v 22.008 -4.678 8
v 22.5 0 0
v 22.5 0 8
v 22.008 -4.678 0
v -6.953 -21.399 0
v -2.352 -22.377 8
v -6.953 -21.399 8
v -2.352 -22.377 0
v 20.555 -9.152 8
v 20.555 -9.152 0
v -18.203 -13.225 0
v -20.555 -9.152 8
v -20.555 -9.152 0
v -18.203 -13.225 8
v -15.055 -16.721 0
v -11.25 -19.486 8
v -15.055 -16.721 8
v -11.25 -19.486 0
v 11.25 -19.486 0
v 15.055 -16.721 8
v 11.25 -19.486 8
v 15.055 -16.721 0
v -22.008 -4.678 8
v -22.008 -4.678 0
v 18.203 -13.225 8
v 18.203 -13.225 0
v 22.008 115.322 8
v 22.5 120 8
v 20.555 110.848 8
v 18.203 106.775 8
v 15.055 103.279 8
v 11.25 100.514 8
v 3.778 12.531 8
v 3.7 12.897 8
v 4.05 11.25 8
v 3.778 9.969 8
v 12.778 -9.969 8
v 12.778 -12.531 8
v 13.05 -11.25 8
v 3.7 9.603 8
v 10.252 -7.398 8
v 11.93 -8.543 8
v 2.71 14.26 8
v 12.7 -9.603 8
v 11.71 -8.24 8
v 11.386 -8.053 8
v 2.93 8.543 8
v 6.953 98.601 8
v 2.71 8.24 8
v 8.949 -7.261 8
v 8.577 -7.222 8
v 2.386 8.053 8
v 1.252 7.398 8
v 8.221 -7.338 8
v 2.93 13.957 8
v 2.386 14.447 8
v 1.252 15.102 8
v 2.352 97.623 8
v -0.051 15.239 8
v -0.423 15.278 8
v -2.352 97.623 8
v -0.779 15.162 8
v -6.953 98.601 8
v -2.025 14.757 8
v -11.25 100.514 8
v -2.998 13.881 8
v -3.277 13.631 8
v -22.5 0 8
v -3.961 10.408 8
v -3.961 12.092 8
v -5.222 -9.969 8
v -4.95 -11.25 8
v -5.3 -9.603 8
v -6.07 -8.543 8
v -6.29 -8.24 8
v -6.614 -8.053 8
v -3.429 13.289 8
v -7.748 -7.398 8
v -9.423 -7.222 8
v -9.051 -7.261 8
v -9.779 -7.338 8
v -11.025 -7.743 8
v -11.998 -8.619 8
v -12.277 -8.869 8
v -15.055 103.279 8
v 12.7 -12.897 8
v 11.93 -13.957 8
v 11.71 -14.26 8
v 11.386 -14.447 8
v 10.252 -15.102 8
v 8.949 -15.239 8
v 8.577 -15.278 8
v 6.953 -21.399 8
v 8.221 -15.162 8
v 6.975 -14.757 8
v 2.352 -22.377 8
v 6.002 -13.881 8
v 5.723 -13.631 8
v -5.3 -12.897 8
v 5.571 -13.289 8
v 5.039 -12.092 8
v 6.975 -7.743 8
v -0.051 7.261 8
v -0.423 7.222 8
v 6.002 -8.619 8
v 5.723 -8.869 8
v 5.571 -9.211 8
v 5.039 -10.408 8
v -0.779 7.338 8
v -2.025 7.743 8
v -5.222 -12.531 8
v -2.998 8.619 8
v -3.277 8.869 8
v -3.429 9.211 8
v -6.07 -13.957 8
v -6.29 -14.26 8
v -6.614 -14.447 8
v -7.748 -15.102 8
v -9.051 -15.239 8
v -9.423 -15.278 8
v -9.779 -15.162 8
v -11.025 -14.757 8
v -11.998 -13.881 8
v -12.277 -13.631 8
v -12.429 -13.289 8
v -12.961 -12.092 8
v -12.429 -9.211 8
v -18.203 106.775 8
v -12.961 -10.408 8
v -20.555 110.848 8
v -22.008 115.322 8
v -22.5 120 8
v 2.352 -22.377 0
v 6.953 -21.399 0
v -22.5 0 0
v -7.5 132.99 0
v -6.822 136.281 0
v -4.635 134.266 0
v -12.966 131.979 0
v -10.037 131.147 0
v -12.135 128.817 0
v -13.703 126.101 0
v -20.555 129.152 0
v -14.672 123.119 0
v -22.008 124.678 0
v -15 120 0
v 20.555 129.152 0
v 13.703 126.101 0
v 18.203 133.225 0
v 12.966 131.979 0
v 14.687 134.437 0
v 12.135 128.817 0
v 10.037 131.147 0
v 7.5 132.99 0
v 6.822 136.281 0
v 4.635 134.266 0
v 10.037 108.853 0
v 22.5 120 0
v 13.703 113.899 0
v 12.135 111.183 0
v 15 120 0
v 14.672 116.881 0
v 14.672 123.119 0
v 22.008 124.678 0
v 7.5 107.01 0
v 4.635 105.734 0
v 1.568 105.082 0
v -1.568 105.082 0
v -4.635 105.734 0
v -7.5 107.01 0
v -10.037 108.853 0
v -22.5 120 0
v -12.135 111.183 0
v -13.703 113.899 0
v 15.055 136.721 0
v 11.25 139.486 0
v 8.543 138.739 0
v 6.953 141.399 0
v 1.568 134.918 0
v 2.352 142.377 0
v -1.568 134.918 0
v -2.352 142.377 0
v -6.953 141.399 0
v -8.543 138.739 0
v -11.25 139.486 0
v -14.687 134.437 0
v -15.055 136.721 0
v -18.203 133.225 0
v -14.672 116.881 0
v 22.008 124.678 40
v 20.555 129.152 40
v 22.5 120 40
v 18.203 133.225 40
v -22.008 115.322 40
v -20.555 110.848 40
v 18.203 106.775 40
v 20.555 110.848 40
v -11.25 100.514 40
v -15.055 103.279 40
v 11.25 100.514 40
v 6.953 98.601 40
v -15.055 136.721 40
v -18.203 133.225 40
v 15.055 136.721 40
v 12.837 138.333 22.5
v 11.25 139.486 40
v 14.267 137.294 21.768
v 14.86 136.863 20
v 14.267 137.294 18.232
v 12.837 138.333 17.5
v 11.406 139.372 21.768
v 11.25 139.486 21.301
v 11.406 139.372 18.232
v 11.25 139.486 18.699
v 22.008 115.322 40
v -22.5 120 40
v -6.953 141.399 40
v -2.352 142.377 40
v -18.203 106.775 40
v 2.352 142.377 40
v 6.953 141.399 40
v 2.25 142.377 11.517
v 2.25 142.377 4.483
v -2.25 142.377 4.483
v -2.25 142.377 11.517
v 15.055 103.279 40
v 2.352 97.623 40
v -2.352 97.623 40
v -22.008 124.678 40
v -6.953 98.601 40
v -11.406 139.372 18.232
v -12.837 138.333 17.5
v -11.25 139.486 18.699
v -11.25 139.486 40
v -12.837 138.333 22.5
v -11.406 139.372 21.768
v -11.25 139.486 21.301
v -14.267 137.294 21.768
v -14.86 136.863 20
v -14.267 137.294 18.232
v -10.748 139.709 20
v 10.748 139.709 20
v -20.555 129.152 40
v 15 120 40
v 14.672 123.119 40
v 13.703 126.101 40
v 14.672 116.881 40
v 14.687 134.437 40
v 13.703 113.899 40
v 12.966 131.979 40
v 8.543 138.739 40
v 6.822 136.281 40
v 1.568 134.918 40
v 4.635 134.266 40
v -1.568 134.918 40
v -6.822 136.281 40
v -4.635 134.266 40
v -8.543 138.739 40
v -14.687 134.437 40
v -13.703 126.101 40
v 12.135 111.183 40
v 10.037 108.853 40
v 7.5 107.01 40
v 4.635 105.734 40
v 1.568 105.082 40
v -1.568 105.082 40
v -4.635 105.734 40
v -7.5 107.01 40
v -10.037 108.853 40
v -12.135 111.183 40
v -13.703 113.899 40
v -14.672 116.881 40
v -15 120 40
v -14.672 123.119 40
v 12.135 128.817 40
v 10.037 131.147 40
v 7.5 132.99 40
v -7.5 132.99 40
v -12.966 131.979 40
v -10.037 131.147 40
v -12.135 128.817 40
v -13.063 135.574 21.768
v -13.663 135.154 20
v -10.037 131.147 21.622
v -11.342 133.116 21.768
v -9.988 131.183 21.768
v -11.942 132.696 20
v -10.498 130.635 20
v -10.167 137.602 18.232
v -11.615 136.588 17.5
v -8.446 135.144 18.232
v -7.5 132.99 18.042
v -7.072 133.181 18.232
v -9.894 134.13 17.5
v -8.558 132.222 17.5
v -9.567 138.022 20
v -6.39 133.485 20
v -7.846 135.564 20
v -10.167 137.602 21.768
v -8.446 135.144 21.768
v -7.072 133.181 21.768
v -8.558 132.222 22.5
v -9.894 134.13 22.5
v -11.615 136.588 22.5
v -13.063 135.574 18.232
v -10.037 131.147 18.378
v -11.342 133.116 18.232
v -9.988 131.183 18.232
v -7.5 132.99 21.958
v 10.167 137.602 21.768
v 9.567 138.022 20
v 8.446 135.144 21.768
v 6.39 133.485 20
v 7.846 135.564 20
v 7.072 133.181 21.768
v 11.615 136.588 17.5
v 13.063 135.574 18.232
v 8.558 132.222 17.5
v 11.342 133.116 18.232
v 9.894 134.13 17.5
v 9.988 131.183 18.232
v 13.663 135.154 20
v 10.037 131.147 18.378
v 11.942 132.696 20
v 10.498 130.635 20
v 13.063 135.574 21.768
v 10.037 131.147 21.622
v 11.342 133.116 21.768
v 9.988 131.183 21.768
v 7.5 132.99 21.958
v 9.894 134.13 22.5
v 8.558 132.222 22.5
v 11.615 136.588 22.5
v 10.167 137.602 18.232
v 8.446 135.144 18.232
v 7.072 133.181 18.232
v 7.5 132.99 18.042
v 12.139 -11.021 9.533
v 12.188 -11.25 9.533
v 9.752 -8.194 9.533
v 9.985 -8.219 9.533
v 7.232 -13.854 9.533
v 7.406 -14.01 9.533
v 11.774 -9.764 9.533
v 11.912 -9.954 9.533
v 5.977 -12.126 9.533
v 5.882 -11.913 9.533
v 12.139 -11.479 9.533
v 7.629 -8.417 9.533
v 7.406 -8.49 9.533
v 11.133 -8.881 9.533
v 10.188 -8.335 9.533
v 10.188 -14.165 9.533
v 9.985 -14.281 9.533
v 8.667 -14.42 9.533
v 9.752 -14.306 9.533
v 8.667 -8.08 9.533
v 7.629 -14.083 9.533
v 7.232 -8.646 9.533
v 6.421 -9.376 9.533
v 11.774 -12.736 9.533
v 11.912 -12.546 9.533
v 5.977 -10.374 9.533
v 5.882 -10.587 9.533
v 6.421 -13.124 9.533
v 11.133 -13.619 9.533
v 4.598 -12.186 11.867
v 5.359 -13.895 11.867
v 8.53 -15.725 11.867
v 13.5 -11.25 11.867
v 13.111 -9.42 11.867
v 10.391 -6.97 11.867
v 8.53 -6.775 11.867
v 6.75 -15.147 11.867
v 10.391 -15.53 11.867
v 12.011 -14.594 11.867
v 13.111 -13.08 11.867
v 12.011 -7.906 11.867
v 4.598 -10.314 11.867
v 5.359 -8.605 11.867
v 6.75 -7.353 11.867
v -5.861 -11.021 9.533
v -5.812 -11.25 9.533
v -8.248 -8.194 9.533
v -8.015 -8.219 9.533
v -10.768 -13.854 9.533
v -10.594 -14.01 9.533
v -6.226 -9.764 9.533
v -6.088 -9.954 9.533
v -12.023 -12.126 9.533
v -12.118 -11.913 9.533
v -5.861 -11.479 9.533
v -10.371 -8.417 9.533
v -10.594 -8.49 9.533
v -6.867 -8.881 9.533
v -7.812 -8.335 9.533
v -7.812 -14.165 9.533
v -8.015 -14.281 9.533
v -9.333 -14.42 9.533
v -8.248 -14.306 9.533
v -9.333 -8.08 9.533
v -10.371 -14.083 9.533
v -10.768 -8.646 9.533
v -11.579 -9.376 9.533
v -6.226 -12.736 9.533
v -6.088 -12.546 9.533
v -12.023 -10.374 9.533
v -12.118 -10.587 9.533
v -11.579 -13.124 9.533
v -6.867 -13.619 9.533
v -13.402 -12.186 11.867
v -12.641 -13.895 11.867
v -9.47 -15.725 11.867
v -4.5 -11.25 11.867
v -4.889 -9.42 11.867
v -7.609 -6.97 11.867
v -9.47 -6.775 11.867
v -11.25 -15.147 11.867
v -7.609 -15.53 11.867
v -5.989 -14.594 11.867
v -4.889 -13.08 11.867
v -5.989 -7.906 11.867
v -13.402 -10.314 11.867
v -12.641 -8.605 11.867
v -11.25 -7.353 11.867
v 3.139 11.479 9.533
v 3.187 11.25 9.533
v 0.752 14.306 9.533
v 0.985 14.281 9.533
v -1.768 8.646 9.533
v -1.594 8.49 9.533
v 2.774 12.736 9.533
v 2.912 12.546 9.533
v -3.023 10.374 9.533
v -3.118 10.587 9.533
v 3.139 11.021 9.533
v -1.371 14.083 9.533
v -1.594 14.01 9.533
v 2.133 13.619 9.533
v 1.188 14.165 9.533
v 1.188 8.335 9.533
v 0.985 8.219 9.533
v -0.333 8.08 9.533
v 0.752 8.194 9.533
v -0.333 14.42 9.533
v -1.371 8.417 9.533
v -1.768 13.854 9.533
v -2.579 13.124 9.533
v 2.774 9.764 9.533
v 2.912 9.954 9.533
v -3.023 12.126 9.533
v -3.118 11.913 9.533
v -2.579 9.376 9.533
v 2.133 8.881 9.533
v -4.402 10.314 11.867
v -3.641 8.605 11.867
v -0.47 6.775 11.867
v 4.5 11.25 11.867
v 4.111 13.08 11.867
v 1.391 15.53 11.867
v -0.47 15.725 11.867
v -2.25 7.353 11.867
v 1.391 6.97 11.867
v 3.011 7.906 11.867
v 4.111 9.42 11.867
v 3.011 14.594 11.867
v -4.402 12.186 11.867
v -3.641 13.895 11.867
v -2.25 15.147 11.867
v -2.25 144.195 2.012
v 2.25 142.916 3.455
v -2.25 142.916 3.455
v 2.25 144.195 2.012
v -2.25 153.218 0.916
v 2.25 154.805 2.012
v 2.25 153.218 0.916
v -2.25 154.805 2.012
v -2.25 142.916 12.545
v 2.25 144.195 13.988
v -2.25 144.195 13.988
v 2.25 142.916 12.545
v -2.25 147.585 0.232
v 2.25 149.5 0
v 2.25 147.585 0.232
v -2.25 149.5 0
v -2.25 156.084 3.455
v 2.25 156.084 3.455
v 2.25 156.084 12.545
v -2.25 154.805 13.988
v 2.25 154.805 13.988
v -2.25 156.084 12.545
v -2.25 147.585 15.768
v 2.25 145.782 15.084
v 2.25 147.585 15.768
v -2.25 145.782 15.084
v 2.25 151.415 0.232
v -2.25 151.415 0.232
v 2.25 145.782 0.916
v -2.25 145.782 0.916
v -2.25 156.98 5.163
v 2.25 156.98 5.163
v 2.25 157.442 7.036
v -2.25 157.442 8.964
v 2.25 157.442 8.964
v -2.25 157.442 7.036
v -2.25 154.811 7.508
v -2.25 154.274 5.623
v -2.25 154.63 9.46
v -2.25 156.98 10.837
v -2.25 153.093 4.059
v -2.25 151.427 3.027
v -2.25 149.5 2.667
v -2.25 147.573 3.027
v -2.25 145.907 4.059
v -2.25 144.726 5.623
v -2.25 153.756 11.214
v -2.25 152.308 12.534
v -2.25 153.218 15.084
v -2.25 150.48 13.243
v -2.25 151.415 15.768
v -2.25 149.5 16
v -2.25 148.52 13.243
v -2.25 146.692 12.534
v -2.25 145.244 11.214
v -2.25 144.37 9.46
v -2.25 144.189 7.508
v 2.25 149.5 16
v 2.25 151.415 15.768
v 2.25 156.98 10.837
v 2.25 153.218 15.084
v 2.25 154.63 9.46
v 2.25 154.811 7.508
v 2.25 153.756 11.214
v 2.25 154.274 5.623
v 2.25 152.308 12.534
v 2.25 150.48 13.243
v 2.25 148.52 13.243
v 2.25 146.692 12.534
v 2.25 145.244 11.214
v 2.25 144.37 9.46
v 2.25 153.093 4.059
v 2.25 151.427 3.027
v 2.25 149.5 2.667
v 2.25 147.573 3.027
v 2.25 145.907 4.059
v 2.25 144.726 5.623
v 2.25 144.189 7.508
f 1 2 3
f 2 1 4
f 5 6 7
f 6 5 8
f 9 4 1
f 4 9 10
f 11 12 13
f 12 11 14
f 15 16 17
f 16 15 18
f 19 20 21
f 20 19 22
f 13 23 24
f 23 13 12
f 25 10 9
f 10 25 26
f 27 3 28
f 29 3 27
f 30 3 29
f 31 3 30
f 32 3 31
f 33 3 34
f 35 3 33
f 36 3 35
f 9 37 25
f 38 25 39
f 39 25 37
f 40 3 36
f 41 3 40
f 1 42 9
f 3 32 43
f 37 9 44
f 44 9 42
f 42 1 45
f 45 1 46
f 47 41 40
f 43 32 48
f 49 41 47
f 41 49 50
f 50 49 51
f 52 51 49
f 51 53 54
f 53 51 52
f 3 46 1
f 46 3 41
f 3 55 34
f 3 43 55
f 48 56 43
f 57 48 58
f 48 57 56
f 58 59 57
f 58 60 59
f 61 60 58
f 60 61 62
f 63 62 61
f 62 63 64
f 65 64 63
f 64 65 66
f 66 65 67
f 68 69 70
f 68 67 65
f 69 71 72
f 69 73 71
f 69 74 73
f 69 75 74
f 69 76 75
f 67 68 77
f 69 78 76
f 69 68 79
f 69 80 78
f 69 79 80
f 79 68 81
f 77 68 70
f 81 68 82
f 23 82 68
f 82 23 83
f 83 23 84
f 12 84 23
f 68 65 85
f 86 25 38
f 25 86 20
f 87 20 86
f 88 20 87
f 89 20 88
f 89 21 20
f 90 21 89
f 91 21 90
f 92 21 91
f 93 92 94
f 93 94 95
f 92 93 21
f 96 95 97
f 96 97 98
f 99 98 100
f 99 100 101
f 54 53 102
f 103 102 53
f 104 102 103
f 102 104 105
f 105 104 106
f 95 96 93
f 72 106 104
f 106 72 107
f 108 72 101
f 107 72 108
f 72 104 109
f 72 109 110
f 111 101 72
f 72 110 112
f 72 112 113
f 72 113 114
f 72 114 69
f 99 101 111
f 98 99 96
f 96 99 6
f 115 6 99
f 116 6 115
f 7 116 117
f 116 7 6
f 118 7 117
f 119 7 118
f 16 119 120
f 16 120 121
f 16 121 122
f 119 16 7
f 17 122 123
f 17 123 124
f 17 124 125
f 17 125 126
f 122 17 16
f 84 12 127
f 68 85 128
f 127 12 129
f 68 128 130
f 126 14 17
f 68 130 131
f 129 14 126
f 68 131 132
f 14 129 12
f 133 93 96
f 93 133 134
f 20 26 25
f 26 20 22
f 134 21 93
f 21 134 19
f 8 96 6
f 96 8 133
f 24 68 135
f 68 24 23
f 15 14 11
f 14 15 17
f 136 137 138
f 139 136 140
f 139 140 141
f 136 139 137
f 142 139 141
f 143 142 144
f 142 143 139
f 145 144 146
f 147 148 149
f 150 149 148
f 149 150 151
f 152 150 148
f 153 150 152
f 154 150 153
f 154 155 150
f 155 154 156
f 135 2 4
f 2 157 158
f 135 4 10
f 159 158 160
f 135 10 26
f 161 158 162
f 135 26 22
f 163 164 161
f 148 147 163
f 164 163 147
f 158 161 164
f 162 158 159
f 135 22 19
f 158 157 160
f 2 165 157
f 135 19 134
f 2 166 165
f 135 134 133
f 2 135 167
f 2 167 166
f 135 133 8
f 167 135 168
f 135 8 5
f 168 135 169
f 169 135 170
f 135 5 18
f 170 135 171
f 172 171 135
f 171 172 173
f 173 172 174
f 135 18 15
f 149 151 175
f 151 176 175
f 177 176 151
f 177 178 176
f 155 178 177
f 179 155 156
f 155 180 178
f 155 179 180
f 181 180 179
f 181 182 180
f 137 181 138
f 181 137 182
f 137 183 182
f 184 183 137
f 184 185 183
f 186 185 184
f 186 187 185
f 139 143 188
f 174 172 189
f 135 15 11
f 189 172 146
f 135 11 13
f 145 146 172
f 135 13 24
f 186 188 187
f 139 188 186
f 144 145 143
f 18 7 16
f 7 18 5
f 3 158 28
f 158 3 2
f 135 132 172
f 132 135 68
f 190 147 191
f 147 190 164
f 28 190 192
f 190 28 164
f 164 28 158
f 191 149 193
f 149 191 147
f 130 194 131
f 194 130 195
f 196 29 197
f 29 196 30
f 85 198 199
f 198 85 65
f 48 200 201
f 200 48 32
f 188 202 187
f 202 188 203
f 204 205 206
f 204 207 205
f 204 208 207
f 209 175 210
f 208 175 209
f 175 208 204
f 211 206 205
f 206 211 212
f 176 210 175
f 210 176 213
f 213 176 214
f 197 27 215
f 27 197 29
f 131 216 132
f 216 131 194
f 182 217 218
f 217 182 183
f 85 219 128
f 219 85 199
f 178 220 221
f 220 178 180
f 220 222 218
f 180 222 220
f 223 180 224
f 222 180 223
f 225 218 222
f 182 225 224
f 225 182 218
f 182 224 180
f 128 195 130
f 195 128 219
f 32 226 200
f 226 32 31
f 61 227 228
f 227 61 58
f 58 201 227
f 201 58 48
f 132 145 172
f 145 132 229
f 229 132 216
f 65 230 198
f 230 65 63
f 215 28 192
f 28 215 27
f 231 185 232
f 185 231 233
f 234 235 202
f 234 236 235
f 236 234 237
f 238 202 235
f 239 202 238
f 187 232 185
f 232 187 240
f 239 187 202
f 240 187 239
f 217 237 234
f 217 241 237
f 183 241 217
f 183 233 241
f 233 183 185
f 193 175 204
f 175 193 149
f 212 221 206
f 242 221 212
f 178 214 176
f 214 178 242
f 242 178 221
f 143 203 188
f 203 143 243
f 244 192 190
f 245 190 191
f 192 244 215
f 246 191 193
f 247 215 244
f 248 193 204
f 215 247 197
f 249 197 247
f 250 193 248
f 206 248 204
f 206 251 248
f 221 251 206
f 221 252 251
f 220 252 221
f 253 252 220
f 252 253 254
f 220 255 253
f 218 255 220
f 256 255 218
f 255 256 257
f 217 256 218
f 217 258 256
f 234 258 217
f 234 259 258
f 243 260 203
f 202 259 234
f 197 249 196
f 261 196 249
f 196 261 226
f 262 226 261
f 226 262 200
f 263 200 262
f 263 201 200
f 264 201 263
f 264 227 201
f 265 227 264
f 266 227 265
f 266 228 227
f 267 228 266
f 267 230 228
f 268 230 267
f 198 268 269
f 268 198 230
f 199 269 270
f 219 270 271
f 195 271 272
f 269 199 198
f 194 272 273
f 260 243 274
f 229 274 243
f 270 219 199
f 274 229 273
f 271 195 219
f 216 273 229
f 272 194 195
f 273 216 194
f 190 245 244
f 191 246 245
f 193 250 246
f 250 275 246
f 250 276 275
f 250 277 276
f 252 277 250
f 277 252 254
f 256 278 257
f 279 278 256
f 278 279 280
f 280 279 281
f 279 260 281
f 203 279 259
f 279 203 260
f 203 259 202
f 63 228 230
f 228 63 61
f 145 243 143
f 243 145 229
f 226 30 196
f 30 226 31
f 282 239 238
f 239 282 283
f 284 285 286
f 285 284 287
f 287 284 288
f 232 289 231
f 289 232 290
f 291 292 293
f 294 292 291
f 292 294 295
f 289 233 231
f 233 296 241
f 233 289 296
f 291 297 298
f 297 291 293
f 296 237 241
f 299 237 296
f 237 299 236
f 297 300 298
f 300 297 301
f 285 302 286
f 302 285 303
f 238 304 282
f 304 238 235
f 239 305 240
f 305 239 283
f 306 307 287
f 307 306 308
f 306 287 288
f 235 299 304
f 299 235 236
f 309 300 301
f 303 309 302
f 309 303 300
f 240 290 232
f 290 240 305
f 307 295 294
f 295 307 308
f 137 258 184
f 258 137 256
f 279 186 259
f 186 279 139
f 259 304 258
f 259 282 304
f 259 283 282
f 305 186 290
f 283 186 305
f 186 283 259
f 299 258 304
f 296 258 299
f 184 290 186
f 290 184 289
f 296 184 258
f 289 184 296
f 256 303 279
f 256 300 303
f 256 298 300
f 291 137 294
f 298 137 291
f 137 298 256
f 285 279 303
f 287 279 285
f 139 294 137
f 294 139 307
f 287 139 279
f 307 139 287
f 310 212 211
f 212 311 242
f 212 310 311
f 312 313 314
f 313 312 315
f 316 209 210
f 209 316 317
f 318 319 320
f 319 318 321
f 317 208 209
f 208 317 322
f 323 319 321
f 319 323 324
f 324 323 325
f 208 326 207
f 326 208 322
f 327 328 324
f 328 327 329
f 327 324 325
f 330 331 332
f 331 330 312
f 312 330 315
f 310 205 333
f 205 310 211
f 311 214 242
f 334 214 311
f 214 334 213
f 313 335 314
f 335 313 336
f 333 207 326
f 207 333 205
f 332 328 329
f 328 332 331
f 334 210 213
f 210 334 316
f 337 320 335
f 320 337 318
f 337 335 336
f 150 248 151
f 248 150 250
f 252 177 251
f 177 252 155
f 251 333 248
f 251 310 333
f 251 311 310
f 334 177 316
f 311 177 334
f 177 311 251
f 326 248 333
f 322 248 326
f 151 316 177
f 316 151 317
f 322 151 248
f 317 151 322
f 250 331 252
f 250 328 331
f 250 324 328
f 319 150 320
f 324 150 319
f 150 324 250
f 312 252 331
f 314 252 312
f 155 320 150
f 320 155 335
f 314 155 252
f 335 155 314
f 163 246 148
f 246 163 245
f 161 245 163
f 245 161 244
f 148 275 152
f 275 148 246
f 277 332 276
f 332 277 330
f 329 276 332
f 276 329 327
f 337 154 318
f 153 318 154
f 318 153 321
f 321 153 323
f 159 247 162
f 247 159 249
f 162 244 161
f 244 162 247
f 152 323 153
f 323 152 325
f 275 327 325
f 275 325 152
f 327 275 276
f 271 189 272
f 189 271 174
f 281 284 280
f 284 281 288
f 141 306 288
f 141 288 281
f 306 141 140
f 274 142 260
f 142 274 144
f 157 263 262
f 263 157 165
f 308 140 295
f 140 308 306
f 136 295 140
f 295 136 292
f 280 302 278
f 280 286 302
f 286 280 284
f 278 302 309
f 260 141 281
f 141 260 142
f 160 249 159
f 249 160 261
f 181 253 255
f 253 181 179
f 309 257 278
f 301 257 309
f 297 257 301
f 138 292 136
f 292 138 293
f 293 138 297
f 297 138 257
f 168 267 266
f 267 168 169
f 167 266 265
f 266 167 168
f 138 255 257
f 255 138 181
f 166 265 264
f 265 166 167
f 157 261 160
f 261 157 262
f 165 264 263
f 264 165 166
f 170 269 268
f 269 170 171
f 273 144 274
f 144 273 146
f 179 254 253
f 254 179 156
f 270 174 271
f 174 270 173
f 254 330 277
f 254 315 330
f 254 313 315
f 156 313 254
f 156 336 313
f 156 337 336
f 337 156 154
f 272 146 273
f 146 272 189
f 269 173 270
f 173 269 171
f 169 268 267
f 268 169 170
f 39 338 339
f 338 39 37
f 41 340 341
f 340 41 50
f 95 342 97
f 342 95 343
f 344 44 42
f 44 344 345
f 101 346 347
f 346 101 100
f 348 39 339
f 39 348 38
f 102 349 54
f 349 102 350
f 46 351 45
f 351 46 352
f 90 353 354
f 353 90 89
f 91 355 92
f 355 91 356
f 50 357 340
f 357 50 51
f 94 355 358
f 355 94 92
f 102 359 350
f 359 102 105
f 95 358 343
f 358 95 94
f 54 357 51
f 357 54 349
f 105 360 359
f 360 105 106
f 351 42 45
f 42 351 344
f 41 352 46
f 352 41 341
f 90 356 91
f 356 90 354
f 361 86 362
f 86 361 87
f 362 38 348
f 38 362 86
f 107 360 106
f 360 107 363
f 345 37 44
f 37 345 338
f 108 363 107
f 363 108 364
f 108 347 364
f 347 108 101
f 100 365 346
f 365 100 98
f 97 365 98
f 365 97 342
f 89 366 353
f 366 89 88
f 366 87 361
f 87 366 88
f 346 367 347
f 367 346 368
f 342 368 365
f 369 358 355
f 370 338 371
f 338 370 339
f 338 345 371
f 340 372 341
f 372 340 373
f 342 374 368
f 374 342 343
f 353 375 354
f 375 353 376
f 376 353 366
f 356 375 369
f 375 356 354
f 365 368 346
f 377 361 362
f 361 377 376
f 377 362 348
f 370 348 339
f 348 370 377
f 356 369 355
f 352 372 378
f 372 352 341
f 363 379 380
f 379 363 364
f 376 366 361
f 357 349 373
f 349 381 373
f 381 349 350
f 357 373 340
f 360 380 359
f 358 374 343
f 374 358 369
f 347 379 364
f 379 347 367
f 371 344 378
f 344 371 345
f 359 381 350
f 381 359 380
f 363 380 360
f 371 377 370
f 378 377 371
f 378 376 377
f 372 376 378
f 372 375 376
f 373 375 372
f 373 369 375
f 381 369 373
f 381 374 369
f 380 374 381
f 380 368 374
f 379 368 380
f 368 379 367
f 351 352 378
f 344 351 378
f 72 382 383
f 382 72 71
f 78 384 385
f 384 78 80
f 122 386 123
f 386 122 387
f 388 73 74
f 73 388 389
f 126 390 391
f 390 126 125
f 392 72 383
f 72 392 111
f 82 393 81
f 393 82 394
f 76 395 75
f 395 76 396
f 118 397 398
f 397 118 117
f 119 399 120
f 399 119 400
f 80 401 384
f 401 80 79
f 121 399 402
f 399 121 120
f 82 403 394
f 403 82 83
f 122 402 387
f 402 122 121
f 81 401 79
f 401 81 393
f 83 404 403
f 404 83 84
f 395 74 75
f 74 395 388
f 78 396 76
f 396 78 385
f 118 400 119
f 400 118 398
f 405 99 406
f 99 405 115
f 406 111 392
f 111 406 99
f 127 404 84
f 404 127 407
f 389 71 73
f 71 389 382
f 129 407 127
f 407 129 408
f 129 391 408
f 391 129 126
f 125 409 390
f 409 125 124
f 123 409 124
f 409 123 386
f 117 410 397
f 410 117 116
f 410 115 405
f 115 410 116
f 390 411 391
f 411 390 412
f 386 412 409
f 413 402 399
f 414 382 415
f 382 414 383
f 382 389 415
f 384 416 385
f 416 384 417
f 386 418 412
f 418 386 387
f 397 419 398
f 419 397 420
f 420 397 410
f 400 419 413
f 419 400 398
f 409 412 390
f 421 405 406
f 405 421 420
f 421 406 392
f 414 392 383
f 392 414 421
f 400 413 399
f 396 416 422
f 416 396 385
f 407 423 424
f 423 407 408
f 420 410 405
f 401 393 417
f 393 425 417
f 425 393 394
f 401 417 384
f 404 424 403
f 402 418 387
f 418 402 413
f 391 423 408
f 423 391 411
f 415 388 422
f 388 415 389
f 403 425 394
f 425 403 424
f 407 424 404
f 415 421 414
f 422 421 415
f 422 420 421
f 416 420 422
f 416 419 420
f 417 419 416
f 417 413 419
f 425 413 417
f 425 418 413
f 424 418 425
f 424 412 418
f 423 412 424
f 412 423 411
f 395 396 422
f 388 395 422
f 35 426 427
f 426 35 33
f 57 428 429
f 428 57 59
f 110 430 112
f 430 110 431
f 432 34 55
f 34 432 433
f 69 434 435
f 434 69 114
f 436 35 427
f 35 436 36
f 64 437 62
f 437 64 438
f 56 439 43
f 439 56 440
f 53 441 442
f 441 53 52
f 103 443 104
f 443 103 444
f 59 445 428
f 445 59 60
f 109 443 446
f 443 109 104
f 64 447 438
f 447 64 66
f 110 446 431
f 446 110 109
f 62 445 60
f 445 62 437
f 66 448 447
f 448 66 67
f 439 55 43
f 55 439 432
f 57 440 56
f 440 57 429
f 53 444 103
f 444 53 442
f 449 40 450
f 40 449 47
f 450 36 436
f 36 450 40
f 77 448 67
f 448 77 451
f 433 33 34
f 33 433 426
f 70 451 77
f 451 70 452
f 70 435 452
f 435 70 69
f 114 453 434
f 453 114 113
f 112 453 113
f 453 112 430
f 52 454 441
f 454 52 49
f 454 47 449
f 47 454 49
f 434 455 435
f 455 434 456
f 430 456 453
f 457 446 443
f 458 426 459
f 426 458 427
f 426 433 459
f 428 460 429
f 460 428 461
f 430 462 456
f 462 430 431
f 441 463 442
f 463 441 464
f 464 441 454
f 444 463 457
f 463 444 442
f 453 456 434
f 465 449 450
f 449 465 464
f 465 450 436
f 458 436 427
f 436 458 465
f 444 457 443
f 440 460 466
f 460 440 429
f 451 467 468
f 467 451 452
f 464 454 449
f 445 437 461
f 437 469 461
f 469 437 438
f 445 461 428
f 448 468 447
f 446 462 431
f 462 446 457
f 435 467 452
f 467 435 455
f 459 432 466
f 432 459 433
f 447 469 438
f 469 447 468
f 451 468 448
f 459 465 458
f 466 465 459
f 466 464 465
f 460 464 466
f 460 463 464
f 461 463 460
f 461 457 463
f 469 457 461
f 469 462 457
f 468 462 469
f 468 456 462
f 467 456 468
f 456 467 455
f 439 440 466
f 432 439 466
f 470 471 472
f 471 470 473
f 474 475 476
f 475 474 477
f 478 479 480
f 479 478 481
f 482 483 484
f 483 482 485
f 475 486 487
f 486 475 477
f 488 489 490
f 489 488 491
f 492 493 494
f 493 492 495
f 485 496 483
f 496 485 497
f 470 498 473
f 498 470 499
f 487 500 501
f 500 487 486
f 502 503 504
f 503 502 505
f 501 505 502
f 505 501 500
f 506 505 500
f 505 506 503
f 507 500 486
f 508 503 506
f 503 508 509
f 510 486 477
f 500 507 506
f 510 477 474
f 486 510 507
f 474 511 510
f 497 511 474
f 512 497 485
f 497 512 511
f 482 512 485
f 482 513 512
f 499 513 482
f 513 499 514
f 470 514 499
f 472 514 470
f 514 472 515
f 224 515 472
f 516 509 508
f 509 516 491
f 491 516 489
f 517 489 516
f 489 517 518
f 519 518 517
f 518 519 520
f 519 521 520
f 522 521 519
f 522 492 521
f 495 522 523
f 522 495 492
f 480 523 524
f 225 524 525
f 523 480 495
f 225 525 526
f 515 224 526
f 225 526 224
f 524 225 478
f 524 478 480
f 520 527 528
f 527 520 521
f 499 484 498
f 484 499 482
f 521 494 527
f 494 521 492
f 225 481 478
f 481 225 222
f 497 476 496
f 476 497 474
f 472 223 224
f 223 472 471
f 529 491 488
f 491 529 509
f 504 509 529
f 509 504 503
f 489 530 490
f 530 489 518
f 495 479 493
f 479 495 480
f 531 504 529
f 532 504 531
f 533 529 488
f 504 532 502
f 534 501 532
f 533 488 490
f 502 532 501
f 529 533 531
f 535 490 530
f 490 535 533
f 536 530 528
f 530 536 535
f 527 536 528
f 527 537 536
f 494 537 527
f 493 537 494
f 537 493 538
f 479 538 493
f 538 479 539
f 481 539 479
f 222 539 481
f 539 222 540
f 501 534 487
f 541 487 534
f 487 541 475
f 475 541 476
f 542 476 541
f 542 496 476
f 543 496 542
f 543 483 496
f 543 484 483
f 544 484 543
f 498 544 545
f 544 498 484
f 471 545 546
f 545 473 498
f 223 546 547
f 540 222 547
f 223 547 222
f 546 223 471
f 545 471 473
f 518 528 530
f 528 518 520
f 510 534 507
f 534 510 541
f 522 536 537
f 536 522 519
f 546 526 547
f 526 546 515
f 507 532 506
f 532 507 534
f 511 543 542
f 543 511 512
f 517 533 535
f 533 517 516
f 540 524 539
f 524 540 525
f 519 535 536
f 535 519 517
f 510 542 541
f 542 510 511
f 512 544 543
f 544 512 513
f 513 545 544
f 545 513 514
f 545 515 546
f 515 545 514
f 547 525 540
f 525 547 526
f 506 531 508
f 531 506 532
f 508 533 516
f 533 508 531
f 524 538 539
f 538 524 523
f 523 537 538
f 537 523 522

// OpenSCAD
mm=1;//initial scale

pt=8*mm;//part thickness
pw=45*mm;//part width
pl=120*mm;//part length
ht=40*mm;//handle thickness
hs=1/3;//hole size (proportion of part width)
ss=5;//screw size
nt=3;//nut thickness
sd=35;//screw distance (in degrees)
rs = 1;//ring size (proportion of part thickness)

hr=pw*hs;//hole radius
ns=ss*1.5;//nut size



module base(){
    union(){
        cylinder(h=pt,r=pw/2);
        translate([-pw/2,0,0]) cube([pw,pl,pt]);
        translate([0,pl,0]) cylinder(h=ht,r=pw/2);
    }
}

module screw(){
    translate([0,0,ht/2]) union(){
        rotate([-90,0,0]) cylinder(h=pw,r=ss/2);
        offset = hr+(pw/2-hr)/2;
        translate([0,offset,0]) cube([ns,nt,ht*2],center=true);
    }
}

module holes(){
    union(){
        cylinder(h=ht*3,r=hr,center=true);
        rotate([0,0,sd]) screw();
        rotate([0,0,-sd]) screw();
    }
}

module pin(){
    union(){
        cylinder(r1=pw/10,r2=pw/15,h=pt/3);
        translate([0,0,pt/4]) cylinder(r1=pw/15,r2=pw/10,h=pt/3);
    }
}

module fixation(){
    translate([pw/5, -pw/4, pt*0.9]) pin();
    translate([-pw/5, -pw/4, pt*0.9]) pin();
    translate([0, pw/4, pt*0.9]) pin();
}

module ring(){
    translate([0,rs*pt,rs*pt]) difference(){
        rotate([0,90,0]) cylinder(r=rs*pt,h=pw/10,center=true);
        rotate([0,90,0]) cylinder(r=rs*pt/1.5,h=pw/5,center=true);
    }
}

union(){
    difference(){
        base();
        translate([0,pl,0]) holes();
    }
    fixation();
    translate([0, (pl+pw/2)-1, 0]) ring();
}
















/*
module corner(thickness,angle,size){
    angle = 90-(angle%90);
    intersection(){
        rotate([0,0,(angle/2)]) cube([size*2,size*2,thickness]);
        rotate([0,0, -(angle/2)]) cube([size*2,size*2,thickness]);
        rotate([0,0,45]) translate([0,0,thickness/2]) cube([size*2,size*2,thickness*2],center=true);
    }
}
*/
